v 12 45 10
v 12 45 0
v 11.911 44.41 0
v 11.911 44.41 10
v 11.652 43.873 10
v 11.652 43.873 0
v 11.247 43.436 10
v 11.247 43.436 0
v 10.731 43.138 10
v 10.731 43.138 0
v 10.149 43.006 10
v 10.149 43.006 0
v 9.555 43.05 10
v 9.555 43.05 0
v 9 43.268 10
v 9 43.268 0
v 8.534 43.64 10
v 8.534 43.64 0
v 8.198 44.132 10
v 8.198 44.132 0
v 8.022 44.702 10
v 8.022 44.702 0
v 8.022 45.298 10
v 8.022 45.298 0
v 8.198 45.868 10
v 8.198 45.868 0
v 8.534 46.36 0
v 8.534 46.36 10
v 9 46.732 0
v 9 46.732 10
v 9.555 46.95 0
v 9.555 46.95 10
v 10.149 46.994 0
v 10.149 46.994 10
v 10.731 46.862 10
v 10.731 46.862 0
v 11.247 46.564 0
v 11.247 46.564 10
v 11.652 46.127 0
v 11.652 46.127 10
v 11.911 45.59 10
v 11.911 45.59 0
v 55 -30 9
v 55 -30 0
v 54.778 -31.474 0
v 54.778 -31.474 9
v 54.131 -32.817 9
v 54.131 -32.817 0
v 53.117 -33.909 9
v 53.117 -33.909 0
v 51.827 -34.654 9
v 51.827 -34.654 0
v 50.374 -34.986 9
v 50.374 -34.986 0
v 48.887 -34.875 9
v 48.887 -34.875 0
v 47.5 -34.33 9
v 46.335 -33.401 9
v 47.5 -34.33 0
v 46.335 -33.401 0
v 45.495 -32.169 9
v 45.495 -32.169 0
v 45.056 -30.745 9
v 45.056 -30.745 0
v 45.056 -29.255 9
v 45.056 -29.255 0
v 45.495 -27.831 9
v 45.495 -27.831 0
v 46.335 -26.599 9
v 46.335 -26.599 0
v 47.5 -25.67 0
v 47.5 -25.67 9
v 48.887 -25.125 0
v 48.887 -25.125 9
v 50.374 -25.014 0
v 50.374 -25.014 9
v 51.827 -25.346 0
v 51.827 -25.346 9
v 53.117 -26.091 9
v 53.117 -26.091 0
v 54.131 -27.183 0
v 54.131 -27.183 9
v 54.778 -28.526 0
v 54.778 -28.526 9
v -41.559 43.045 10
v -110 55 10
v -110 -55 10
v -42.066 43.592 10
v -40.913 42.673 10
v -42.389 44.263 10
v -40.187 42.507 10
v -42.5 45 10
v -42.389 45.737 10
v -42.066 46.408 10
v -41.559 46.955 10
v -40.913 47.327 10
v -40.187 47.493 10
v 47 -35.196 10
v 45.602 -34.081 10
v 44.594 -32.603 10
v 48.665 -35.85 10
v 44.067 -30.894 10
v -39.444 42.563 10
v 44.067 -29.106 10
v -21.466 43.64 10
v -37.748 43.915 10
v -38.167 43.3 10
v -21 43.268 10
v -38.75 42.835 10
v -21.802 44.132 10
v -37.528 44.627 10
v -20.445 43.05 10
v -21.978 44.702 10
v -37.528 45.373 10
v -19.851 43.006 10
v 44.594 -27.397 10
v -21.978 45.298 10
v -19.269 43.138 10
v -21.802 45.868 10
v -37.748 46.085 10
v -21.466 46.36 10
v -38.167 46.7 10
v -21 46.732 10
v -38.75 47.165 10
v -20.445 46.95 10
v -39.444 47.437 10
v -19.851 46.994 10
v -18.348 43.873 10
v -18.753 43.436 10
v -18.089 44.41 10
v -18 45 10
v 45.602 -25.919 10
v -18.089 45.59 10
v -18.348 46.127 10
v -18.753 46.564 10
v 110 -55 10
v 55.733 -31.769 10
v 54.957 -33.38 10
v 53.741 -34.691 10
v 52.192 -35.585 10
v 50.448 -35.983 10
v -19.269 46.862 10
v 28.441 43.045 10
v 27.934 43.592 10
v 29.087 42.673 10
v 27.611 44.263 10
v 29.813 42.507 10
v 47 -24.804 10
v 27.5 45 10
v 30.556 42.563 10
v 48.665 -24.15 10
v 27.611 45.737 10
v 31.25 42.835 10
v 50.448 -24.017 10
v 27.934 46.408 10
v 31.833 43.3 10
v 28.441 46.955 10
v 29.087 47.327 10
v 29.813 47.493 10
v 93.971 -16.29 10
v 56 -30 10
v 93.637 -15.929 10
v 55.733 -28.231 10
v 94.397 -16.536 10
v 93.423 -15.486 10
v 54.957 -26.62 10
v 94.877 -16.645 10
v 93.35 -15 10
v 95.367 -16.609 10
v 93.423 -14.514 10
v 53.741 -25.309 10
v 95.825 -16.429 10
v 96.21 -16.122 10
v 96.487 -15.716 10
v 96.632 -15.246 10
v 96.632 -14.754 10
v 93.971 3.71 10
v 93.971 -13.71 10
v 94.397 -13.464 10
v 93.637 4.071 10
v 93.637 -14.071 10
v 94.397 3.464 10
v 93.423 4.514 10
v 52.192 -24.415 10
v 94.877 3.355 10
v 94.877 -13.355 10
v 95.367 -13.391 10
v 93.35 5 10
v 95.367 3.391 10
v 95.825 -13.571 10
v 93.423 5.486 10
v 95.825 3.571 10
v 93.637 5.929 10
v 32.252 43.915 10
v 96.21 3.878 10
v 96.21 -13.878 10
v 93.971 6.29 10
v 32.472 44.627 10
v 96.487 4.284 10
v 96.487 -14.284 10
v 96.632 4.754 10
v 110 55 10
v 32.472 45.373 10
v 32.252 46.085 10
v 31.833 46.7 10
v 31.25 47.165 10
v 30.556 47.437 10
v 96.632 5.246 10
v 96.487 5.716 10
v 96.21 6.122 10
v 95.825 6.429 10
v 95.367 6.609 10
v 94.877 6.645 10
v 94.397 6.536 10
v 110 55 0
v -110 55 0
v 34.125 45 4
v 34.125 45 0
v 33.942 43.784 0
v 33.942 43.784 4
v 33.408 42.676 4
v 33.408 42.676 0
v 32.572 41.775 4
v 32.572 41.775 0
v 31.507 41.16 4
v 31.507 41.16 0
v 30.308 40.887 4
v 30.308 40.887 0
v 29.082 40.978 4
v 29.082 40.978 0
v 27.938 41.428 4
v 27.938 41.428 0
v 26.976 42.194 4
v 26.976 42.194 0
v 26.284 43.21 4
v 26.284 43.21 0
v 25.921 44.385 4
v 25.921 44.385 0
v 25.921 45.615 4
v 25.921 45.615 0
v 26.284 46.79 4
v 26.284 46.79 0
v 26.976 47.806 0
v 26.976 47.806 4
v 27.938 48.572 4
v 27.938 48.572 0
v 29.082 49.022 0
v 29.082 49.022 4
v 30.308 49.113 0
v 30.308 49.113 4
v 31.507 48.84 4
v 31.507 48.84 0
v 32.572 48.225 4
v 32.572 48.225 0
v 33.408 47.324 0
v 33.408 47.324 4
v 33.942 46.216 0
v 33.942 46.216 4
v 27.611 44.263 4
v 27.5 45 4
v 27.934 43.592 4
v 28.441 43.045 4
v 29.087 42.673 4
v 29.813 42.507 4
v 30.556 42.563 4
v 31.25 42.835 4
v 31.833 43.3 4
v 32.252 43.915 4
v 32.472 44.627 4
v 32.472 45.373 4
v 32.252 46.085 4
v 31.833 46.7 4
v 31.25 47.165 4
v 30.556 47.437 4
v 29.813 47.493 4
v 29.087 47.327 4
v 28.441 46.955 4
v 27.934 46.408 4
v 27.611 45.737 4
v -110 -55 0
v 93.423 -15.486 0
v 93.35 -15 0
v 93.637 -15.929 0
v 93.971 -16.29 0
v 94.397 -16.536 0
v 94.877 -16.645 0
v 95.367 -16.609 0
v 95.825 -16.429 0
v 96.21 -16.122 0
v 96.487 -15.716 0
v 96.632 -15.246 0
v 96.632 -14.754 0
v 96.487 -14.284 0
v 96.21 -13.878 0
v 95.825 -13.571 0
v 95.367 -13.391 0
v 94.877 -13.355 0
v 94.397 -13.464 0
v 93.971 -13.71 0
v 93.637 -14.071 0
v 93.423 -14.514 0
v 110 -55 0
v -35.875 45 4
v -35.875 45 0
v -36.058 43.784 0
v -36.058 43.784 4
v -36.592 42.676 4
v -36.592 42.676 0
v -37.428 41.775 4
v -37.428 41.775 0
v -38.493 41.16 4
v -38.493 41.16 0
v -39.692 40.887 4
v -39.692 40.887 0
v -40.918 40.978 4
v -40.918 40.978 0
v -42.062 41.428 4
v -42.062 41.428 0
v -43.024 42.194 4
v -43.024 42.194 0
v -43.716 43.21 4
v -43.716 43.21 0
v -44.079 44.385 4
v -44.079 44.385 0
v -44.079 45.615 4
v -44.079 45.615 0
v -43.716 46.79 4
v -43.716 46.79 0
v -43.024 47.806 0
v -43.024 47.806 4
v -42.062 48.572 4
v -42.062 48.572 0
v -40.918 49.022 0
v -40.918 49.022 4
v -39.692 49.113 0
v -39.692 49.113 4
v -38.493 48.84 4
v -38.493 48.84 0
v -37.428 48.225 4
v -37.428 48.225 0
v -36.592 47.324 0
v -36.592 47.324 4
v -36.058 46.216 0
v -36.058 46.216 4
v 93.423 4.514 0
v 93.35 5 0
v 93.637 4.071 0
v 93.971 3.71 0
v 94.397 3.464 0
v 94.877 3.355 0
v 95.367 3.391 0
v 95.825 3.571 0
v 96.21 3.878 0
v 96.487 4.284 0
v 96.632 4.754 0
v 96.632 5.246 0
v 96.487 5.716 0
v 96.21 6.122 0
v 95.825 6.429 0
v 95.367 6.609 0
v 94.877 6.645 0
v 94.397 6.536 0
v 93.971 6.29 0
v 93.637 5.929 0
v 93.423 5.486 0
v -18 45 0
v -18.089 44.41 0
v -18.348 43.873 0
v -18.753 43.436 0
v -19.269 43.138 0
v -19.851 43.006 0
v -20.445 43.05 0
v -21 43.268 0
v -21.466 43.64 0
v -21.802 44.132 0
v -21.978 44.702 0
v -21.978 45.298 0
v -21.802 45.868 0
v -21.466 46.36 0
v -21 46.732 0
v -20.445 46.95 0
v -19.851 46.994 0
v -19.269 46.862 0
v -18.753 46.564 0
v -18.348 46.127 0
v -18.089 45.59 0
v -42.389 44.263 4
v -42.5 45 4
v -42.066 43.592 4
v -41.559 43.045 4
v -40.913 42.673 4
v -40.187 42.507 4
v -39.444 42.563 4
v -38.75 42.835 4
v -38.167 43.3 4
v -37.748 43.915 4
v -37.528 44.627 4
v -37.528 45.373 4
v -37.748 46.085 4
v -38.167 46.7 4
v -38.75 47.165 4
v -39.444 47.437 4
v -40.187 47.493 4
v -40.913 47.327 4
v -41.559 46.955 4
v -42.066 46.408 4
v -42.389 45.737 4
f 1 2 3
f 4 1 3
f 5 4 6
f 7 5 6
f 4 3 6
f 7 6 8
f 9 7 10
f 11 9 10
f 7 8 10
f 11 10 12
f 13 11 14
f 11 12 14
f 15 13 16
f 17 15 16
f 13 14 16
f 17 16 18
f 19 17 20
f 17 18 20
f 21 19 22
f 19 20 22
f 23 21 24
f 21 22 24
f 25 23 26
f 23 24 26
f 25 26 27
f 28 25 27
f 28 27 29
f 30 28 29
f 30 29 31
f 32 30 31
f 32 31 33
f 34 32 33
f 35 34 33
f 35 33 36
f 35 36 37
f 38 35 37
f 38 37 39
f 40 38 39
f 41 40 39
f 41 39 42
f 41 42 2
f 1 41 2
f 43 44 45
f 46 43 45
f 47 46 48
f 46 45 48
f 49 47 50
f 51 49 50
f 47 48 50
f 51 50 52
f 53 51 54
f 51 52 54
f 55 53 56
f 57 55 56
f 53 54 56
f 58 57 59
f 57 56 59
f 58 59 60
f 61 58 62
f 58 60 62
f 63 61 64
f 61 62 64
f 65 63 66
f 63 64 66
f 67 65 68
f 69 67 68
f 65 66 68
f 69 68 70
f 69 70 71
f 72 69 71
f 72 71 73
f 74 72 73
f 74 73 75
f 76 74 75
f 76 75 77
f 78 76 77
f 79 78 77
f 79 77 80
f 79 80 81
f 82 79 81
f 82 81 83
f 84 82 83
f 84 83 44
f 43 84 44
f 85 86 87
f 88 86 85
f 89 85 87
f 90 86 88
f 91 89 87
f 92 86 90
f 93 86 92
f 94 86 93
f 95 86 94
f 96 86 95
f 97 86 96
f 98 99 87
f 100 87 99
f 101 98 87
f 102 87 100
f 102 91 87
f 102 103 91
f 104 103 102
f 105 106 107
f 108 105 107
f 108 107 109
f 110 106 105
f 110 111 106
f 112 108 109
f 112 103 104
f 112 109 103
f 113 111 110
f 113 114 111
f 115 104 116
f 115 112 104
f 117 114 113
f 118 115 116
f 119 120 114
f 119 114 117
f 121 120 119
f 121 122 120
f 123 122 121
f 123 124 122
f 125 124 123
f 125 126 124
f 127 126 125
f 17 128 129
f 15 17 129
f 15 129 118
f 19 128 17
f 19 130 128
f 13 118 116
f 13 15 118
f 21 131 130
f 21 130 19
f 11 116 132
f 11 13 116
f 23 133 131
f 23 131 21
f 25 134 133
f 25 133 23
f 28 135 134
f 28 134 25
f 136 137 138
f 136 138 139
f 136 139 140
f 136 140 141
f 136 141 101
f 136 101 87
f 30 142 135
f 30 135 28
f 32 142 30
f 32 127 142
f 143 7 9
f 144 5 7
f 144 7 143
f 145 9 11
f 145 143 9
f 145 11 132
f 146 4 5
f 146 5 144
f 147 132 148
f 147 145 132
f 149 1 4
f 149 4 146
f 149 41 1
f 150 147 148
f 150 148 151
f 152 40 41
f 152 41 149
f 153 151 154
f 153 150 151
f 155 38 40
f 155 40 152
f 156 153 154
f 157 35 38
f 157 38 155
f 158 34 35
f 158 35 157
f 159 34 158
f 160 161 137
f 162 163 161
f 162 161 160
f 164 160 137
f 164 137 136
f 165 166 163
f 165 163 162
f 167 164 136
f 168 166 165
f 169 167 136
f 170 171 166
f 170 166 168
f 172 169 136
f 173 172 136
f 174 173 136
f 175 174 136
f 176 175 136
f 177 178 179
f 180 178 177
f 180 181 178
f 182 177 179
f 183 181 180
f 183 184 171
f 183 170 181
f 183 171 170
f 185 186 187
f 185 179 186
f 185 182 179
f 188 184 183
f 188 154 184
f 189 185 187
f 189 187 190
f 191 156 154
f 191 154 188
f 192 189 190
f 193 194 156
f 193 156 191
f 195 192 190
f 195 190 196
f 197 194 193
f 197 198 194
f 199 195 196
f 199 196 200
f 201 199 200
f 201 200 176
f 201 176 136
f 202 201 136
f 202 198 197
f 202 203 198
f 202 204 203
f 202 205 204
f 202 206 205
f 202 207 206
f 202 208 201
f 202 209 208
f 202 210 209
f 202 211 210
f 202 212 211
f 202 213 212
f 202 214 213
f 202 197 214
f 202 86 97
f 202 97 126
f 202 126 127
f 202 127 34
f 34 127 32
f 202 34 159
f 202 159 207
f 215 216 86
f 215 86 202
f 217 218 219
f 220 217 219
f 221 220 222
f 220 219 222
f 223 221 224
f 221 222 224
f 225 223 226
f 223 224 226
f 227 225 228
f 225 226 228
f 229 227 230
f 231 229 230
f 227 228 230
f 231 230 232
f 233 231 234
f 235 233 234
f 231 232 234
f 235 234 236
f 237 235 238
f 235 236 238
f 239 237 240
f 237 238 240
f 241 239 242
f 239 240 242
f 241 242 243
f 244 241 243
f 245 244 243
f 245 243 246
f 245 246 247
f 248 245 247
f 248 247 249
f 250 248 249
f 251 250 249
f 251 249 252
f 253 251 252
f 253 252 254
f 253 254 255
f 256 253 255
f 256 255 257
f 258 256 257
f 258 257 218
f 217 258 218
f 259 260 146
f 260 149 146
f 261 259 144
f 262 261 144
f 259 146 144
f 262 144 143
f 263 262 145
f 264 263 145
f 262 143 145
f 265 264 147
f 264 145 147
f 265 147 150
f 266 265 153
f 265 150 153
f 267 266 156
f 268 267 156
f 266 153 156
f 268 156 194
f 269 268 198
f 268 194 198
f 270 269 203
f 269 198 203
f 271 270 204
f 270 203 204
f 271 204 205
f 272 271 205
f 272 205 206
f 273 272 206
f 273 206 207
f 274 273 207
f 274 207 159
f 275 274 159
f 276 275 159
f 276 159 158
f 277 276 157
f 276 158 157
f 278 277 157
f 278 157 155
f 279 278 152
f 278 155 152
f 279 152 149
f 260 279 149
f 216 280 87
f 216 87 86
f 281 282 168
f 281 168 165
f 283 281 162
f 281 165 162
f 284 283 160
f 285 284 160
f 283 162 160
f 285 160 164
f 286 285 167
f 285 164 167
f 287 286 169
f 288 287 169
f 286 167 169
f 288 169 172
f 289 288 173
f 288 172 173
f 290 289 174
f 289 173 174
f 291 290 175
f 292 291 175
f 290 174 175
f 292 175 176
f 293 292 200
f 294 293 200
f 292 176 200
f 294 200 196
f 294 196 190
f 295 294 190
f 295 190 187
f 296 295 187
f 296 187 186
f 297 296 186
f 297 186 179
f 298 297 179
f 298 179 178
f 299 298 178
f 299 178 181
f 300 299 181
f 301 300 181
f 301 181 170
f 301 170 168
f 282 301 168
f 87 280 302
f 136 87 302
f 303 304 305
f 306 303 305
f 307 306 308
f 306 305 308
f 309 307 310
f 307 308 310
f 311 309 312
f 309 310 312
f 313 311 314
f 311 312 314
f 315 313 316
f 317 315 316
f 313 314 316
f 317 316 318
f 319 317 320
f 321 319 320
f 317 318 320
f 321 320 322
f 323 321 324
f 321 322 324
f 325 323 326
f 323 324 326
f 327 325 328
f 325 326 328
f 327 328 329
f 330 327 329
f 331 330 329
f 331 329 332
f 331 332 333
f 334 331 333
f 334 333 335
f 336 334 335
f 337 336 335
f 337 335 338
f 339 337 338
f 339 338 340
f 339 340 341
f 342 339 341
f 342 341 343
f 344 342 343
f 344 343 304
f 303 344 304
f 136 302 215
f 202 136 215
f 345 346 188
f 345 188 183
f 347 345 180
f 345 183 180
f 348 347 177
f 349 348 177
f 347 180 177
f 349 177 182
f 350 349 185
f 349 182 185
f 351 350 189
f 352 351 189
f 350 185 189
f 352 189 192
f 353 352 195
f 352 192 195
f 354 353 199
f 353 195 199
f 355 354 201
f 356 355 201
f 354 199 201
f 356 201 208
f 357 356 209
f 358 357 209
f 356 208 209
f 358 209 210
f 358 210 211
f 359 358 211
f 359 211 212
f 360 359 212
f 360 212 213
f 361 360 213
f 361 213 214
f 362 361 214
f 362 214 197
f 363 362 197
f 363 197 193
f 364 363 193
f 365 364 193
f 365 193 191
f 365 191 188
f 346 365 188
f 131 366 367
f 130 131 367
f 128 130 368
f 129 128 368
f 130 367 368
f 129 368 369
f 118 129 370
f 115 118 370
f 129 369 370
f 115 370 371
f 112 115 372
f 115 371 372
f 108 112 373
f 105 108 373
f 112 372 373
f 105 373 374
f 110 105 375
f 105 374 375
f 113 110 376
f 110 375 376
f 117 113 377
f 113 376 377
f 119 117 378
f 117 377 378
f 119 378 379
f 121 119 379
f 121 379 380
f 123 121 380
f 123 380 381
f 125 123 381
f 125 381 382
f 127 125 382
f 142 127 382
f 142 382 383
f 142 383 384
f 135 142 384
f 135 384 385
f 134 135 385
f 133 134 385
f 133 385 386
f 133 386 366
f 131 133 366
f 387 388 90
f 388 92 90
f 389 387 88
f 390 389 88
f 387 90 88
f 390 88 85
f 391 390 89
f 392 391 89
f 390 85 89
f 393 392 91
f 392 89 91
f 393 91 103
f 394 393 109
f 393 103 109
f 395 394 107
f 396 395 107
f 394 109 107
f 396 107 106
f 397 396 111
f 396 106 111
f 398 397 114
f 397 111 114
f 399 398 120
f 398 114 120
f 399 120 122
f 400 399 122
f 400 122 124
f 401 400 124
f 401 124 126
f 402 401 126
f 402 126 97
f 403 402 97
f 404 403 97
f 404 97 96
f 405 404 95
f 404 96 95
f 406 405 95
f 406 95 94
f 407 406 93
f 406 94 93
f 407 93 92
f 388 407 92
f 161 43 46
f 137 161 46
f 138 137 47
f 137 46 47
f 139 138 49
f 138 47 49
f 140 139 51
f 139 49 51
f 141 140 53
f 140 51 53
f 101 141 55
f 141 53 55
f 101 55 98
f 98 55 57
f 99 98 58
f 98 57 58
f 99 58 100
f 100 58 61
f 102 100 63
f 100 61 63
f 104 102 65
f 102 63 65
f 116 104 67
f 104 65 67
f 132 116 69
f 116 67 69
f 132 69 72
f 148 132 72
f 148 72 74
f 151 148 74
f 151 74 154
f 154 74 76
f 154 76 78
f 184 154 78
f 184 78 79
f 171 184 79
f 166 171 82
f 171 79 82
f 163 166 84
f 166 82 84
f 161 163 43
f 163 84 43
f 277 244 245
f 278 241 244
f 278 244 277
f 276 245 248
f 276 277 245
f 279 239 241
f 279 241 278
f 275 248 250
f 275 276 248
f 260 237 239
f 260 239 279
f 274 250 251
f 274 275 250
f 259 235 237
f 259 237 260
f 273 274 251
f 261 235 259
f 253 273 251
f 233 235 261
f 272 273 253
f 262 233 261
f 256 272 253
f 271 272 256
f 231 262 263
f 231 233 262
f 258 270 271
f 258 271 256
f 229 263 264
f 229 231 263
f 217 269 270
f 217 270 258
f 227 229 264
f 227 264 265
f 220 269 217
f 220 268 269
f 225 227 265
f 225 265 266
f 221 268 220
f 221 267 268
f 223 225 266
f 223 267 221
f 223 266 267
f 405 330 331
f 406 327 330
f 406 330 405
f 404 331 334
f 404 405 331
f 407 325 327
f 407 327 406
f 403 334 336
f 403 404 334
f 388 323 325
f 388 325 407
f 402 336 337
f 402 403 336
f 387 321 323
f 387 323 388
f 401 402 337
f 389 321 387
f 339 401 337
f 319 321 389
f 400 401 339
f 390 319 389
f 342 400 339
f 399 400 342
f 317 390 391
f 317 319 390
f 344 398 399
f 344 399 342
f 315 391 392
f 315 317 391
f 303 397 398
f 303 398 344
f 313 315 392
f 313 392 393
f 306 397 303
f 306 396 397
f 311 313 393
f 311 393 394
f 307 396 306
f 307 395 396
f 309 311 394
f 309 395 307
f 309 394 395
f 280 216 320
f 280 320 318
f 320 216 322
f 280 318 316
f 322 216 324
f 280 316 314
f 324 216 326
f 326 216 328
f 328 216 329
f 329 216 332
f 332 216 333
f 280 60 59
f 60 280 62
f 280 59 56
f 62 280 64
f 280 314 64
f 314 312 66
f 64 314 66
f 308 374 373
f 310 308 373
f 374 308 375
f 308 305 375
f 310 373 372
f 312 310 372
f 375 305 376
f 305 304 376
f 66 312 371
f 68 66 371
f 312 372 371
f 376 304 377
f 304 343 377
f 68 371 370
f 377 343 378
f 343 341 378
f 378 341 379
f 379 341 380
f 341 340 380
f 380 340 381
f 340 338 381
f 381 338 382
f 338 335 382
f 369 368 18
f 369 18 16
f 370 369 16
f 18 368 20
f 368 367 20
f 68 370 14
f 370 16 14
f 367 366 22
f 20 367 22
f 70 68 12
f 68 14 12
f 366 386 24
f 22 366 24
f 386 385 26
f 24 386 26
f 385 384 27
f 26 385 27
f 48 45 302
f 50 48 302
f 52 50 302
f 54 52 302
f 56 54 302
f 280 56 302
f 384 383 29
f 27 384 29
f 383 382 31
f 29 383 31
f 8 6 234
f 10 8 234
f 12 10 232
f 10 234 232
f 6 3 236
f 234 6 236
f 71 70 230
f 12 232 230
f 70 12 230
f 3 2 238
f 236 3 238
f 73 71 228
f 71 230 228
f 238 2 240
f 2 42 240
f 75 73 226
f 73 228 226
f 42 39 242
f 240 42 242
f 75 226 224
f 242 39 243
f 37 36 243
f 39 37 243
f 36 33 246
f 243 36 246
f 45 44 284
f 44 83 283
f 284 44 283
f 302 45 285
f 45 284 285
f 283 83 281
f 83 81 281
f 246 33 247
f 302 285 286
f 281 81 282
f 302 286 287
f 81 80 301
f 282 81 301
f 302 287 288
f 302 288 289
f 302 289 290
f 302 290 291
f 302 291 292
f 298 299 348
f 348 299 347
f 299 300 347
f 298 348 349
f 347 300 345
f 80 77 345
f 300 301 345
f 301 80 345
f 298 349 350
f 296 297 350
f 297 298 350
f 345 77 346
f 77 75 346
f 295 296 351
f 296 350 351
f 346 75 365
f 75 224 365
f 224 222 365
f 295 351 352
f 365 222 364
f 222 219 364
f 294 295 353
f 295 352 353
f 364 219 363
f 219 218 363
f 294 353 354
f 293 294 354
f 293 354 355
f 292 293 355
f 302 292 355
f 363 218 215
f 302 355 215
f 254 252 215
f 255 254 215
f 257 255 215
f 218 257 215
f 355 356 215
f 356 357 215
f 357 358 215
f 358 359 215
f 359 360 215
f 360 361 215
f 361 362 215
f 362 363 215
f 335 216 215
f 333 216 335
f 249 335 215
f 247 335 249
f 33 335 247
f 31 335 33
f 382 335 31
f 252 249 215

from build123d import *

# Parameters (mm, degrees)
F0_W           = 220
F0_H           = 110
F1_DEPTH       = 10
F2_R           = 5
F2_R_2         = 2
F3_DEPTH       = 10.001
F4_D           = 3.3
F5_D           = 5
F5_CBORE_D     = 8.25
F5_CBORE_DEPTH = 4
F6_SIZE        = 1


with BuildPart() as f1:
    # F0 (on Top) → F1 (new body)
    with BuildSketch(Plane.XY):
        Rectangle(F0_W, F0_H)
    extrude(amount=F1_DEPTH)

    # F2 (on face) → F3 (cut, through all)
    with BuildSketch(Plane(origin=(0, 0, 0), x_dir=(1, 0, 0), z_dir=(0, 0, -1))):
        with Locations((50, 30)):
            Circle(F2_R)
        with Locations((-20, -45)):
            Circle(F2_R_2)
        with Locations((10, -45)):
            Circle(F2_R_2)
    extrude(amount=-F3_DEPTH, mode=Mode.SUBTRACT)

    # F4 (through all)
    with Locations(Plane(origin=(0, 0, 0), x_dir=(1, 0, 0), z_dir=(0, 0, -1))):
        with Locations((95, -5), (95, 15)):
            Hole(F4_D / 2)

    # F5 (through all)
    with Locations(Plane(origin=(0, 0, 0), x_dir=(1, 0, 0), z_dir=(0, 0, -1))):
        with Locations((-40, -45), (30, -45)):
            CounterBoreHole(F5_D / 2, F5_CBORE_D / 2, F5_CBORE_DEPTH)

    # F6
    f6_edges = [f1.edges().sort_by_distance(p)[0] for p in [
        (45, -30, 10),
    ]]
    chamfer(f6_edges, length=F6_SIZE)


solid = f1.part
